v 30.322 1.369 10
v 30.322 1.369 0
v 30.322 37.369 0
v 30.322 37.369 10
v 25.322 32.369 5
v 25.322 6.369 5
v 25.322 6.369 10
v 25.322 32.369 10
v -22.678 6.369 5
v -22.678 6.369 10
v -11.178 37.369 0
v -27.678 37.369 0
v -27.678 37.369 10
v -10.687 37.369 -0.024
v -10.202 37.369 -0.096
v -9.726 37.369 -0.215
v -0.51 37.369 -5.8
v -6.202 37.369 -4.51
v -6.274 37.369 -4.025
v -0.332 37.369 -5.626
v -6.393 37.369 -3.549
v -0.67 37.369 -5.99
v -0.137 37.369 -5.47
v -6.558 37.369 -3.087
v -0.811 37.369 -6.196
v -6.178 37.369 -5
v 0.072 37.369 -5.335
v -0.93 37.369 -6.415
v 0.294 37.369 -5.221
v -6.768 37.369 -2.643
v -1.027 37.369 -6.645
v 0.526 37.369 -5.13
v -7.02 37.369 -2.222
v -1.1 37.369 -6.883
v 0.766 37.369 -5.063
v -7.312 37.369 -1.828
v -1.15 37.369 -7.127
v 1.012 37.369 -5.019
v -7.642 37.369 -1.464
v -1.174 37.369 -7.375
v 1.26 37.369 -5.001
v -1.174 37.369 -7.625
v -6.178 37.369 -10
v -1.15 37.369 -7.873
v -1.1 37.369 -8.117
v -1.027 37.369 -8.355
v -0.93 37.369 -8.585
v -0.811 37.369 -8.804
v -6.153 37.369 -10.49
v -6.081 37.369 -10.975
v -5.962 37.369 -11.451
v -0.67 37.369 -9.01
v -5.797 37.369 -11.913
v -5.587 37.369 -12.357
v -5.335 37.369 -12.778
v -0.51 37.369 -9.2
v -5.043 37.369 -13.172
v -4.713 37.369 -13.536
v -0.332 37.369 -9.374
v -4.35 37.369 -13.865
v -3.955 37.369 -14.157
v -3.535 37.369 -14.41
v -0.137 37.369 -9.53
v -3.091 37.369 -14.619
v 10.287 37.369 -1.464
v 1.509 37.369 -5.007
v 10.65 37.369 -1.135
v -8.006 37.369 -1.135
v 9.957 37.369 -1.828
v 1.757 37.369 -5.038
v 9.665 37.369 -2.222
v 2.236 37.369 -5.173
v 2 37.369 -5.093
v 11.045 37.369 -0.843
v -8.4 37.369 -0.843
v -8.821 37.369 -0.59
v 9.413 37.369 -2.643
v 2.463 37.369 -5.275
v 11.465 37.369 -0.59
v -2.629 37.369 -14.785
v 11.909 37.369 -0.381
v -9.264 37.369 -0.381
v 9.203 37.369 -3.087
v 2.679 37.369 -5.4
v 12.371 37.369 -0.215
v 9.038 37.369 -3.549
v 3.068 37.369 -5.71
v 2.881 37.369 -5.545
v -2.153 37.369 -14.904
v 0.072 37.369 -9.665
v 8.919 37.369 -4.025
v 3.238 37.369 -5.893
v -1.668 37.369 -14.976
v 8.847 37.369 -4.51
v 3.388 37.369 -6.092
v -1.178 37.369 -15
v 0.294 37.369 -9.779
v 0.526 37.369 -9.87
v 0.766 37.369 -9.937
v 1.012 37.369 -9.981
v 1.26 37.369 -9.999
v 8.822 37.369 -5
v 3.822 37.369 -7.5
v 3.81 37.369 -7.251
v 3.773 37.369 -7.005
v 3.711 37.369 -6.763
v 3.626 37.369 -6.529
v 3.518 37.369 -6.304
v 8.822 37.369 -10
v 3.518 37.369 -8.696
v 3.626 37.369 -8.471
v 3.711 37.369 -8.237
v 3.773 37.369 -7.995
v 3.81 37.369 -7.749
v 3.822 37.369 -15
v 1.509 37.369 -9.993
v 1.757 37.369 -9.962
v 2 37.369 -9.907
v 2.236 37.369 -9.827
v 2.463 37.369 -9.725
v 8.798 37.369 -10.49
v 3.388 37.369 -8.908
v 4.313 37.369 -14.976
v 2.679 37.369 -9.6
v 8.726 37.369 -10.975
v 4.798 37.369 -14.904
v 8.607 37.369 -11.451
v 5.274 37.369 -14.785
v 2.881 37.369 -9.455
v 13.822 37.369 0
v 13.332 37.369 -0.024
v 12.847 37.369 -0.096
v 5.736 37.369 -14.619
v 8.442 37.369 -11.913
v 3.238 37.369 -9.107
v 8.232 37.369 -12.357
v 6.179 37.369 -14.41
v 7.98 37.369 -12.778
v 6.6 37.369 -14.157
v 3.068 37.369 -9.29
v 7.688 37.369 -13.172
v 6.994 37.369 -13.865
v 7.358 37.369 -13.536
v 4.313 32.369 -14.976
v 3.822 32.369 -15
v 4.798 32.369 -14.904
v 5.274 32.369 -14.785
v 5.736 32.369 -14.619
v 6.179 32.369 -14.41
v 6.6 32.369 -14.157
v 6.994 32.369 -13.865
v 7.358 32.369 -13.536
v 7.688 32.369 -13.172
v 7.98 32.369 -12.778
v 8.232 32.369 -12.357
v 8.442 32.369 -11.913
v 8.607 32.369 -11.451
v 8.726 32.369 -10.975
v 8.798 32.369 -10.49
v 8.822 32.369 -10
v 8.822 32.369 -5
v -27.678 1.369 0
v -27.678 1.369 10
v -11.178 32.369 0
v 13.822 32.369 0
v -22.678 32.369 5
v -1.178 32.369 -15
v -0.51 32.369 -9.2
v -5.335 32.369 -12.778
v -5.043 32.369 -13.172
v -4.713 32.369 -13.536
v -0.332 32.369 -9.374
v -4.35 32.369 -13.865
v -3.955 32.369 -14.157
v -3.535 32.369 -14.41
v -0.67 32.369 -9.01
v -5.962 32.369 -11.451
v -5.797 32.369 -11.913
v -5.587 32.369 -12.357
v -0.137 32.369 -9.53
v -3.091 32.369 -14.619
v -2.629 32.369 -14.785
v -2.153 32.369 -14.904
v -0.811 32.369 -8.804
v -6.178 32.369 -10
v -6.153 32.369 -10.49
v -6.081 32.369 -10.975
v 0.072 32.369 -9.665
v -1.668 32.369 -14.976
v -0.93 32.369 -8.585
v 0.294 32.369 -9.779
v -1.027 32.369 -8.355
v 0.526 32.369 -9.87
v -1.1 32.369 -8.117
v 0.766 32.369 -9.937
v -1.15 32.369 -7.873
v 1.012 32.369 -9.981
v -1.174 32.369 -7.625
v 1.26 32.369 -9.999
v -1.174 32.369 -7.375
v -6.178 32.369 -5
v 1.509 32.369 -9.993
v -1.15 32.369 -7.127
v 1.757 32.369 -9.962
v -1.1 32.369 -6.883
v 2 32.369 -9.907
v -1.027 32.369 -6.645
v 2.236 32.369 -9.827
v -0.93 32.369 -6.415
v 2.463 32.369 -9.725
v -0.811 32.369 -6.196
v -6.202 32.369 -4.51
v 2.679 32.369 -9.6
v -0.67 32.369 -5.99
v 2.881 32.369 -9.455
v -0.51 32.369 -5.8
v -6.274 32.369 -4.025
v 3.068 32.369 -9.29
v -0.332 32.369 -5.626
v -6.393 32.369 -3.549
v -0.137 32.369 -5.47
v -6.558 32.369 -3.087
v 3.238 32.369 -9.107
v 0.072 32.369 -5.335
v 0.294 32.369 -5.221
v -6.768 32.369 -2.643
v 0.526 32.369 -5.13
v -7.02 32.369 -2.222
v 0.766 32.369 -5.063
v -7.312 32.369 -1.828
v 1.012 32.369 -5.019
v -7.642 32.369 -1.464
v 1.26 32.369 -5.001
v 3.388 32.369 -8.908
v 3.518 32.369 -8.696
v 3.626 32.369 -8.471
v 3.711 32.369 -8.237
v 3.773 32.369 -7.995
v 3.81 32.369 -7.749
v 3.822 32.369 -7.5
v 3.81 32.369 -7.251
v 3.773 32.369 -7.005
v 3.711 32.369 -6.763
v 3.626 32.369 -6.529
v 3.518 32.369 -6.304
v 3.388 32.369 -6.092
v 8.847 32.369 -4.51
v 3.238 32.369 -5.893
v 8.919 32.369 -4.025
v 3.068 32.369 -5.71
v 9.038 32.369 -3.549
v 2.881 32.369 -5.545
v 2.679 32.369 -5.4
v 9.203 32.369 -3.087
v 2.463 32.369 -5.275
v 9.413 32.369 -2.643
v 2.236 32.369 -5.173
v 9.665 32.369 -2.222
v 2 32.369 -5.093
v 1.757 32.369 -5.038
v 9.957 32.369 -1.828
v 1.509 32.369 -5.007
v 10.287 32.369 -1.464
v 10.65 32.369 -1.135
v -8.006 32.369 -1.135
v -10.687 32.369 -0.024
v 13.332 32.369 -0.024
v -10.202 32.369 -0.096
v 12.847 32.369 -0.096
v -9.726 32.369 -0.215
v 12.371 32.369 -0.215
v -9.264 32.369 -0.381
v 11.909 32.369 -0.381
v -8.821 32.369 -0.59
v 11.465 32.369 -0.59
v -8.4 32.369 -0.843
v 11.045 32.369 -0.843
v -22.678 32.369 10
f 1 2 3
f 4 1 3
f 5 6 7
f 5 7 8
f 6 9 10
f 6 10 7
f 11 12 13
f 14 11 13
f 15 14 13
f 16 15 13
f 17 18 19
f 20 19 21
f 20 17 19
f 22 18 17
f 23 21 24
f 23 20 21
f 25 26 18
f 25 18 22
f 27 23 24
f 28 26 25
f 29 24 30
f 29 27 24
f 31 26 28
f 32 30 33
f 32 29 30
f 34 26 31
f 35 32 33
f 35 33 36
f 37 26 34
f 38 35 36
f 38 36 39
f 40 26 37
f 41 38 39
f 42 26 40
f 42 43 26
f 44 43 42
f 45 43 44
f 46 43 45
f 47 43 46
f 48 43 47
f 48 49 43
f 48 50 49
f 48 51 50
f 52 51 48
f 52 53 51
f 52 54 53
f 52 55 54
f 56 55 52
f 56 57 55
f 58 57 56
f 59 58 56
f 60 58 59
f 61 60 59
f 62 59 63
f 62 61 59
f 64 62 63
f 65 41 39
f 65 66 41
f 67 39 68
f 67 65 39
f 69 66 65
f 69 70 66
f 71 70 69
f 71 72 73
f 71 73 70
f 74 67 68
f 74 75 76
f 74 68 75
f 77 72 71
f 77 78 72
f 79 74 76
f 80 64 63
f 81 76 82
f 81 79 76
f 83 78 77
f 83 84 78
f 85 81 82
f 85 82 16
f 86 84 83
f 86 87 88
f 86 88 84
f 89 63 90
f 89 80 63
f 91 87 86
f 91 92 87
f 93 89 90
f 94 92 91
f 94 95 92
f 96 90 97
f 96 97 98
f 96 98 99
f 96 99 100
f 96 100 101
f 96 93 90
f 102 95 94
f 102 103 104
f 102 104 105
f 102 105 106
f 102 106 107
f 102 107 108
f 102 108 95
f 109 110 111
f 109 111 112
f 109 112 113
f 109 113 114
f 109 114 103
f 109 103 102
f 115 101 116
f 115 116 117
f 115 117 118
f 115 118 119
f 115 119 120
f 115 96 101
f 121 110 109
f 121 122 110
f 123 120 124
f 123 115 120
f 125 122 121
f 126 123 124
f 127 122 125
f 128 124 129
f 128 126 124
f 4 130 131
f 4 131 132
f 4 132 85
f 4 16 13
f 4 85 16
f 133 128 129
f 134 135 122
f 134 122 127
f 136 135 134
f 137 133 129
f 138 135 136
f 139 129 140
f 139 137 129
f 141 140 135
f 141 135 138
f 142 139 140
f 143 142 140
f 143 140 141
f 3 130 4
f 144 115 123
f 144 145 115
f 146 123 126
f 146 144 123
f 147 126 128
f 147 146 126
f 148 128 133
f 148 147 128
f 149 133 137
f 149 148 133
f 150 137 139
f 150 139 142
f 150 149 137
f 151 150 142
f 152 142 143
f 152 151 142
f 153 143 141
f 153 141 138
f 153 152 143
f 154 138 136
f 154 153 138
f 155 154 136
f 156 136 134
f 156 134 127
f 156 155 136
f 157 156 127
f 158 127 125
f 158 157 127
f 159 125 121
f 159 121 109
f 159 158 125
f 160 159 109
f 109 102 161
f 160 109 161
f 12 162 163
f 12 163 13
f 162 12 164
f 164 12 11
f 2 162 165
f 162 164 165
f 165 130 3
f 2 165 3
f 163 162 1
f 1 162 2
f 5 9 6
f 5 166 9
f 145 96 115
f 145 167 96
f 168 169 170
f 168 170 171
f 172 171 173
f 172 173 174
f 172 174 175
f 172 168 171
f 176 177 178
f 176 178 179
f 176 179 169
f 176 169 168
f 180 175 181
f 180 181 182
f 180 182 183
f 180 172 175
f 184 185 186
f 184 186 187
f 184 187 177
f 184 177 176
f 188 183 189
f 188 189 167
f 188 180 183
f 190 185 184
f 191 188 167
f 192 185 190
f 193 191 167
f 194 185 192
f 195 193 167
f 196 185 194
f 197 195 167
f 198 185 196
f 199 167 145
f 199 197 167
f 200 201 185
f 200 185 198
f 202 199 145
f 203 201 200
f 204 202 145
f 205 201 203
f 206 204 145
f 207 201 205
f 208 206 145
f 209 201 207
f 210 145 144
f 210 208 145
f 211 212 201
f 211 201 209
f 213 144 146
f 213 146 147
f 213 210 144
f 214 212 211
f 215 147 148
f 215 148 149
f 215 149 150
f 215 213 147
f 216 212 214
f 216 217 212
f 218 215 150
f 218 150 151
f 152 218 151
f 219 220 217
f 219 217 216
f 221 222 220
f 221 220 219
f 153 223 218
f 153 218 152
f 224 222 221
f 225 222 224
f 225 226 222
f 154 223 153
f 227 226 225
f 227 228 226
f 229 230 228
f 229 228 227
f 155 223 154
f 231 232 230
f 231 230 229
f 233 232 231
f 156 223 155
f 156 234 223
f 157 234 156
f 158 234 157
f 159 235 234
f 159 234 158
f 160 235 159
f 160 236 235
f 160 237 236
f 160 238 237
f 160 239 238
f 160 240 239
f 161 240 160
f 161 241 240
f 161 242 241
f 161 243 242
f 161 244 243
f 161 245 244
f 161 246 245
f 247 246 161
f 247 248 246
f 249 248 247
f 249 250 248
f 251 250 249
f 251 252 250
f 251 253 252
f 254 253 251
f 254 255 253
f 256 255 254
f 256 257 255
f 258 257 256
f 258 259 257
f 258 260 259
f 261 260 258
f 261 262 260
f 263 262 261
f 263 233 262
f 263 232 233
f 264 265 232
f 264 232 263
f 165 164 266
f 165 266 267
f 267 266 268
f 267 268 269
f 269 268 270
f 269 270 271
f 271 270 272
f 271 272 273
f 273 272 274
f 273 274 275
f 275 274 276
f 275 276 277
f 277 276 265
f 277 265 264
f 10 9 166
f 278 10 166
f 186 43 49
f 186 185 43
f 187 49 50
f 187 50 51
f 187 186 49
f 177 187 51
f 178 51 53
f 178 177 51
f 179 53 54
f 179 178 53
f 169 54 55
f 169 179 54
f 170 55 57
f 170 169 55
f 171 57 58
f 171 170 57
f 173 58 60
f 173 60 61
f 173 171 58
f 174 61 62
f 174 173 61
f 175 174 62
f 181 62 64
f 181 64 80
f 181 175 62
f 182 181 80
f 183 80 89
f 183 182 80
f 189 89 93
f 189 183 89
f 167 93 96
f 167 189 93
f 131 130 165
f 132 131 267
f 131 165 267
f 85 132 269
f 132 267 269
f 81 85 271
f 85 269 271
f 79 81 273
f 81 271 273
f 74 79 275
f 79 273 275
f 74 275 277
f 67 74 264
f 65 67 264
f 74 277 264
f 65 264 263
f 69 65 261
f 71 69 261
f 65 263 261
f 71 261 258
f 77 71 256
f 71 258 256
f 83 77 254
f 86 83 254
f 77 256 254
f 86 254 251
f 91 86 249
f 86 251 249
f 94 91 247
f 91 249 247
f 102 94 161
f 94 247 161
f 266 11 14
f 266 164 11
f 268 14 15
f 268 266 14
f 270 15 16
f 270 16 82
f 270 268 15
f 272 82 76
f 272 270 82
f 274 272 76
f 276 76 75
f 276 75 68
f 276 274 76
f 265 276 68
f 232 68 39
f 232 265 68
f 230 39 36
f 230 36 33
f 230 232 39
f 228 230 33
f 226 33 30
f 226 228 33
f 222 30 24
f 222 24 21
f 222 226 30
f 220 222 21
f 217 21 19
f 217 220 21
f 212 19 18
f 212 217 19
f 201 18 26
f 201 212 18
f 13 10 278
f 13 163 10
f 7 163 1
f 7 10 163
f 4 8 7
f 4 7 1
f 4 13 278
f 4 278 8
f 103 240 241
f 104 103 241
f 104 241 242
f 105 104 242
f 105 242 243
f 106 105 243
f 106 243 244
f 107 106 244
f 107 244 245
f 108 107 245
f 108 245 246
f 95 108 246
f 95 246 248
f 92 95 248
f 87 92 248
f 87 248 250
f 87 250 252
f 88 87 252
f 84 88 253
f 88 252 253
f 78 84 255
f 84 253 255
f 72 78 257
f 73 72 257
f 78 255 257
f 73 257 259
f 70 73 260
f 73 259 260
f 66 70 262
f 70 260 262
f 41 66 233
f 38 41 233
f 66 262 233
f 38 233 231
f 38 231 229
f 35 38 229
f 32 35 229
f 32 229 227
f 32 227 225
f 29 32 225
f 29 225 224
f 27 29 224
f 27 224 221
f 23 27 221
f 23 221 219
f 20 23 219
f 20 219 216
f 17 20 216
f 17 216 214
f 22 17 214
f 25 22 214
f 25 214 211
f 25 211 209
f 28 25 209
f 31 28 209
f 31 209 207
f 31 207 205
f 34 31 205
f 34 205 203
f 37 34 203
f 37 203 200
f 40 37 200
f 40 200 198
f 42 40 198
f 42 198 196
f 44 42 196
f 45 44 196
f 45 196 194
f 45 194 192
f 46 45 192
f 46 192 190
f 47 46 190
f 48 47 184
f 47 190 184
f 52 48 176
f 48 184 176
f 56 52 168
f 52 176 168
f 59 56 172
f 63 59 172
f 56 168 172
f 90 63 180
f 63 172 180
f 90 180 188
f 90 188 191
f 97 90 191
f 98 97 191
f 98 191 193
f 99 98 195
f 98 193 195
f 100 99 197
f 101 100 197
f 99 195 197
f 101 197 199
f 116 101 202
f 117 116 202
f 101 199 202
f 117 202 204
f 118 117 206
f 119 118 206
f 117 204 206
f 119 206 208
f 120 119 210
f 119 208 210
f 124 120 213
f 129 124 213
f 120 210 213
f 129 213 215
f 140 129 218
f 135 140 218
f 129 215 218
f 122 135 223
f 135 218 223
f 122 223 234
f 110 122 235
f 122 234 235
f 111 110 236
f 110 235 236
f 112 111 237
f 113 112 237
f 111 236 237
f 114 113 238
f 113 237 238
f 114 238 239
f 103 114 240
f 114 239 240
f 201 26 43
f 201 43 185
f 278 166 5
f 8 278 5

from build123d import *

# Parameters (mm, degrees)
F0_W     = 58
F0_H     = 36
F0_W_2   = 48
F0_H_2   = 26
F1_DEPTH = 5
F2_DEPTH = 10
F3_W     = 15
F3_H     = 5
F4_DEPTH = 15
F5_R     = 2.5
F6_DEPTH = 25
F7_R     = 5


# Not quite as in the source:
# - a feature names something its author has since deleted; it is built from what else it names


with BuildPart() as f1:
    # F0 (on Top) → F1 (new body)
    with BuildSketch(Plane.XY):
        with Locations((1.3224579843, 19.3690634753)):
            Rectangle(F0_W, F0_H)
        with Locations((1.3224579843, 19.3690634753)):
            Rectangle(F0_W_2, F0_H_2, mode=Mode.SUBTRACT)
        with Locations((1.3224579843, 19.3690634753)):
            Rectangle(F0_W_2, F0_H_2)
    extrude(amount=F1_DEPTH)

    # F0 (on Top) → F2 (join)
    with BuildSketch(Plane.XY):
        with Locations((1.3224579843, 19.3690634753)):
            Rectangle(F0_W, F0_H)
        with Locations((1.3224579843, 19.3690634753)):
            Rectangle(F0_W_2, F0_H_2, mode=Mode.SUBTRACT)
    extrude(amount=F2_DEPTH)

    # F3 (on face) → F4 (join)
    with BuildSketch(Plane(origin=(0, 0, 0), x_dir=(1, 0, 0), z_dir=(0, 0, -1))):
        with Locations((1.3224579843, -34.8690634753)):
            Rectangle(F3_W, F3_H)
    extrude(amount=F4_DEPTH)

    # F5 (on face) → F6 (cut)
    with BuildSketch(Plane.XZ.offset(-32.3690634753)):
        with Locations((1.3224579843, -7.5)):
            Circle(F5_R)
    extrude(amount=-F6_DEPTH, mode=Mode.SUBTRACT)

    # F7
    f7_edges = [f1.edges().sort_by_distance(p)[0] for p in [
        (8.822458, 34.869063, -15),
        (-6.177542, 34.869063, -15),
        (8.822458, 34.869063, 0),
        (-6.177542, 34.869063, 0),
    ]]
    fillet(f7_edges, radius=F7_R)


solid = f1.part
